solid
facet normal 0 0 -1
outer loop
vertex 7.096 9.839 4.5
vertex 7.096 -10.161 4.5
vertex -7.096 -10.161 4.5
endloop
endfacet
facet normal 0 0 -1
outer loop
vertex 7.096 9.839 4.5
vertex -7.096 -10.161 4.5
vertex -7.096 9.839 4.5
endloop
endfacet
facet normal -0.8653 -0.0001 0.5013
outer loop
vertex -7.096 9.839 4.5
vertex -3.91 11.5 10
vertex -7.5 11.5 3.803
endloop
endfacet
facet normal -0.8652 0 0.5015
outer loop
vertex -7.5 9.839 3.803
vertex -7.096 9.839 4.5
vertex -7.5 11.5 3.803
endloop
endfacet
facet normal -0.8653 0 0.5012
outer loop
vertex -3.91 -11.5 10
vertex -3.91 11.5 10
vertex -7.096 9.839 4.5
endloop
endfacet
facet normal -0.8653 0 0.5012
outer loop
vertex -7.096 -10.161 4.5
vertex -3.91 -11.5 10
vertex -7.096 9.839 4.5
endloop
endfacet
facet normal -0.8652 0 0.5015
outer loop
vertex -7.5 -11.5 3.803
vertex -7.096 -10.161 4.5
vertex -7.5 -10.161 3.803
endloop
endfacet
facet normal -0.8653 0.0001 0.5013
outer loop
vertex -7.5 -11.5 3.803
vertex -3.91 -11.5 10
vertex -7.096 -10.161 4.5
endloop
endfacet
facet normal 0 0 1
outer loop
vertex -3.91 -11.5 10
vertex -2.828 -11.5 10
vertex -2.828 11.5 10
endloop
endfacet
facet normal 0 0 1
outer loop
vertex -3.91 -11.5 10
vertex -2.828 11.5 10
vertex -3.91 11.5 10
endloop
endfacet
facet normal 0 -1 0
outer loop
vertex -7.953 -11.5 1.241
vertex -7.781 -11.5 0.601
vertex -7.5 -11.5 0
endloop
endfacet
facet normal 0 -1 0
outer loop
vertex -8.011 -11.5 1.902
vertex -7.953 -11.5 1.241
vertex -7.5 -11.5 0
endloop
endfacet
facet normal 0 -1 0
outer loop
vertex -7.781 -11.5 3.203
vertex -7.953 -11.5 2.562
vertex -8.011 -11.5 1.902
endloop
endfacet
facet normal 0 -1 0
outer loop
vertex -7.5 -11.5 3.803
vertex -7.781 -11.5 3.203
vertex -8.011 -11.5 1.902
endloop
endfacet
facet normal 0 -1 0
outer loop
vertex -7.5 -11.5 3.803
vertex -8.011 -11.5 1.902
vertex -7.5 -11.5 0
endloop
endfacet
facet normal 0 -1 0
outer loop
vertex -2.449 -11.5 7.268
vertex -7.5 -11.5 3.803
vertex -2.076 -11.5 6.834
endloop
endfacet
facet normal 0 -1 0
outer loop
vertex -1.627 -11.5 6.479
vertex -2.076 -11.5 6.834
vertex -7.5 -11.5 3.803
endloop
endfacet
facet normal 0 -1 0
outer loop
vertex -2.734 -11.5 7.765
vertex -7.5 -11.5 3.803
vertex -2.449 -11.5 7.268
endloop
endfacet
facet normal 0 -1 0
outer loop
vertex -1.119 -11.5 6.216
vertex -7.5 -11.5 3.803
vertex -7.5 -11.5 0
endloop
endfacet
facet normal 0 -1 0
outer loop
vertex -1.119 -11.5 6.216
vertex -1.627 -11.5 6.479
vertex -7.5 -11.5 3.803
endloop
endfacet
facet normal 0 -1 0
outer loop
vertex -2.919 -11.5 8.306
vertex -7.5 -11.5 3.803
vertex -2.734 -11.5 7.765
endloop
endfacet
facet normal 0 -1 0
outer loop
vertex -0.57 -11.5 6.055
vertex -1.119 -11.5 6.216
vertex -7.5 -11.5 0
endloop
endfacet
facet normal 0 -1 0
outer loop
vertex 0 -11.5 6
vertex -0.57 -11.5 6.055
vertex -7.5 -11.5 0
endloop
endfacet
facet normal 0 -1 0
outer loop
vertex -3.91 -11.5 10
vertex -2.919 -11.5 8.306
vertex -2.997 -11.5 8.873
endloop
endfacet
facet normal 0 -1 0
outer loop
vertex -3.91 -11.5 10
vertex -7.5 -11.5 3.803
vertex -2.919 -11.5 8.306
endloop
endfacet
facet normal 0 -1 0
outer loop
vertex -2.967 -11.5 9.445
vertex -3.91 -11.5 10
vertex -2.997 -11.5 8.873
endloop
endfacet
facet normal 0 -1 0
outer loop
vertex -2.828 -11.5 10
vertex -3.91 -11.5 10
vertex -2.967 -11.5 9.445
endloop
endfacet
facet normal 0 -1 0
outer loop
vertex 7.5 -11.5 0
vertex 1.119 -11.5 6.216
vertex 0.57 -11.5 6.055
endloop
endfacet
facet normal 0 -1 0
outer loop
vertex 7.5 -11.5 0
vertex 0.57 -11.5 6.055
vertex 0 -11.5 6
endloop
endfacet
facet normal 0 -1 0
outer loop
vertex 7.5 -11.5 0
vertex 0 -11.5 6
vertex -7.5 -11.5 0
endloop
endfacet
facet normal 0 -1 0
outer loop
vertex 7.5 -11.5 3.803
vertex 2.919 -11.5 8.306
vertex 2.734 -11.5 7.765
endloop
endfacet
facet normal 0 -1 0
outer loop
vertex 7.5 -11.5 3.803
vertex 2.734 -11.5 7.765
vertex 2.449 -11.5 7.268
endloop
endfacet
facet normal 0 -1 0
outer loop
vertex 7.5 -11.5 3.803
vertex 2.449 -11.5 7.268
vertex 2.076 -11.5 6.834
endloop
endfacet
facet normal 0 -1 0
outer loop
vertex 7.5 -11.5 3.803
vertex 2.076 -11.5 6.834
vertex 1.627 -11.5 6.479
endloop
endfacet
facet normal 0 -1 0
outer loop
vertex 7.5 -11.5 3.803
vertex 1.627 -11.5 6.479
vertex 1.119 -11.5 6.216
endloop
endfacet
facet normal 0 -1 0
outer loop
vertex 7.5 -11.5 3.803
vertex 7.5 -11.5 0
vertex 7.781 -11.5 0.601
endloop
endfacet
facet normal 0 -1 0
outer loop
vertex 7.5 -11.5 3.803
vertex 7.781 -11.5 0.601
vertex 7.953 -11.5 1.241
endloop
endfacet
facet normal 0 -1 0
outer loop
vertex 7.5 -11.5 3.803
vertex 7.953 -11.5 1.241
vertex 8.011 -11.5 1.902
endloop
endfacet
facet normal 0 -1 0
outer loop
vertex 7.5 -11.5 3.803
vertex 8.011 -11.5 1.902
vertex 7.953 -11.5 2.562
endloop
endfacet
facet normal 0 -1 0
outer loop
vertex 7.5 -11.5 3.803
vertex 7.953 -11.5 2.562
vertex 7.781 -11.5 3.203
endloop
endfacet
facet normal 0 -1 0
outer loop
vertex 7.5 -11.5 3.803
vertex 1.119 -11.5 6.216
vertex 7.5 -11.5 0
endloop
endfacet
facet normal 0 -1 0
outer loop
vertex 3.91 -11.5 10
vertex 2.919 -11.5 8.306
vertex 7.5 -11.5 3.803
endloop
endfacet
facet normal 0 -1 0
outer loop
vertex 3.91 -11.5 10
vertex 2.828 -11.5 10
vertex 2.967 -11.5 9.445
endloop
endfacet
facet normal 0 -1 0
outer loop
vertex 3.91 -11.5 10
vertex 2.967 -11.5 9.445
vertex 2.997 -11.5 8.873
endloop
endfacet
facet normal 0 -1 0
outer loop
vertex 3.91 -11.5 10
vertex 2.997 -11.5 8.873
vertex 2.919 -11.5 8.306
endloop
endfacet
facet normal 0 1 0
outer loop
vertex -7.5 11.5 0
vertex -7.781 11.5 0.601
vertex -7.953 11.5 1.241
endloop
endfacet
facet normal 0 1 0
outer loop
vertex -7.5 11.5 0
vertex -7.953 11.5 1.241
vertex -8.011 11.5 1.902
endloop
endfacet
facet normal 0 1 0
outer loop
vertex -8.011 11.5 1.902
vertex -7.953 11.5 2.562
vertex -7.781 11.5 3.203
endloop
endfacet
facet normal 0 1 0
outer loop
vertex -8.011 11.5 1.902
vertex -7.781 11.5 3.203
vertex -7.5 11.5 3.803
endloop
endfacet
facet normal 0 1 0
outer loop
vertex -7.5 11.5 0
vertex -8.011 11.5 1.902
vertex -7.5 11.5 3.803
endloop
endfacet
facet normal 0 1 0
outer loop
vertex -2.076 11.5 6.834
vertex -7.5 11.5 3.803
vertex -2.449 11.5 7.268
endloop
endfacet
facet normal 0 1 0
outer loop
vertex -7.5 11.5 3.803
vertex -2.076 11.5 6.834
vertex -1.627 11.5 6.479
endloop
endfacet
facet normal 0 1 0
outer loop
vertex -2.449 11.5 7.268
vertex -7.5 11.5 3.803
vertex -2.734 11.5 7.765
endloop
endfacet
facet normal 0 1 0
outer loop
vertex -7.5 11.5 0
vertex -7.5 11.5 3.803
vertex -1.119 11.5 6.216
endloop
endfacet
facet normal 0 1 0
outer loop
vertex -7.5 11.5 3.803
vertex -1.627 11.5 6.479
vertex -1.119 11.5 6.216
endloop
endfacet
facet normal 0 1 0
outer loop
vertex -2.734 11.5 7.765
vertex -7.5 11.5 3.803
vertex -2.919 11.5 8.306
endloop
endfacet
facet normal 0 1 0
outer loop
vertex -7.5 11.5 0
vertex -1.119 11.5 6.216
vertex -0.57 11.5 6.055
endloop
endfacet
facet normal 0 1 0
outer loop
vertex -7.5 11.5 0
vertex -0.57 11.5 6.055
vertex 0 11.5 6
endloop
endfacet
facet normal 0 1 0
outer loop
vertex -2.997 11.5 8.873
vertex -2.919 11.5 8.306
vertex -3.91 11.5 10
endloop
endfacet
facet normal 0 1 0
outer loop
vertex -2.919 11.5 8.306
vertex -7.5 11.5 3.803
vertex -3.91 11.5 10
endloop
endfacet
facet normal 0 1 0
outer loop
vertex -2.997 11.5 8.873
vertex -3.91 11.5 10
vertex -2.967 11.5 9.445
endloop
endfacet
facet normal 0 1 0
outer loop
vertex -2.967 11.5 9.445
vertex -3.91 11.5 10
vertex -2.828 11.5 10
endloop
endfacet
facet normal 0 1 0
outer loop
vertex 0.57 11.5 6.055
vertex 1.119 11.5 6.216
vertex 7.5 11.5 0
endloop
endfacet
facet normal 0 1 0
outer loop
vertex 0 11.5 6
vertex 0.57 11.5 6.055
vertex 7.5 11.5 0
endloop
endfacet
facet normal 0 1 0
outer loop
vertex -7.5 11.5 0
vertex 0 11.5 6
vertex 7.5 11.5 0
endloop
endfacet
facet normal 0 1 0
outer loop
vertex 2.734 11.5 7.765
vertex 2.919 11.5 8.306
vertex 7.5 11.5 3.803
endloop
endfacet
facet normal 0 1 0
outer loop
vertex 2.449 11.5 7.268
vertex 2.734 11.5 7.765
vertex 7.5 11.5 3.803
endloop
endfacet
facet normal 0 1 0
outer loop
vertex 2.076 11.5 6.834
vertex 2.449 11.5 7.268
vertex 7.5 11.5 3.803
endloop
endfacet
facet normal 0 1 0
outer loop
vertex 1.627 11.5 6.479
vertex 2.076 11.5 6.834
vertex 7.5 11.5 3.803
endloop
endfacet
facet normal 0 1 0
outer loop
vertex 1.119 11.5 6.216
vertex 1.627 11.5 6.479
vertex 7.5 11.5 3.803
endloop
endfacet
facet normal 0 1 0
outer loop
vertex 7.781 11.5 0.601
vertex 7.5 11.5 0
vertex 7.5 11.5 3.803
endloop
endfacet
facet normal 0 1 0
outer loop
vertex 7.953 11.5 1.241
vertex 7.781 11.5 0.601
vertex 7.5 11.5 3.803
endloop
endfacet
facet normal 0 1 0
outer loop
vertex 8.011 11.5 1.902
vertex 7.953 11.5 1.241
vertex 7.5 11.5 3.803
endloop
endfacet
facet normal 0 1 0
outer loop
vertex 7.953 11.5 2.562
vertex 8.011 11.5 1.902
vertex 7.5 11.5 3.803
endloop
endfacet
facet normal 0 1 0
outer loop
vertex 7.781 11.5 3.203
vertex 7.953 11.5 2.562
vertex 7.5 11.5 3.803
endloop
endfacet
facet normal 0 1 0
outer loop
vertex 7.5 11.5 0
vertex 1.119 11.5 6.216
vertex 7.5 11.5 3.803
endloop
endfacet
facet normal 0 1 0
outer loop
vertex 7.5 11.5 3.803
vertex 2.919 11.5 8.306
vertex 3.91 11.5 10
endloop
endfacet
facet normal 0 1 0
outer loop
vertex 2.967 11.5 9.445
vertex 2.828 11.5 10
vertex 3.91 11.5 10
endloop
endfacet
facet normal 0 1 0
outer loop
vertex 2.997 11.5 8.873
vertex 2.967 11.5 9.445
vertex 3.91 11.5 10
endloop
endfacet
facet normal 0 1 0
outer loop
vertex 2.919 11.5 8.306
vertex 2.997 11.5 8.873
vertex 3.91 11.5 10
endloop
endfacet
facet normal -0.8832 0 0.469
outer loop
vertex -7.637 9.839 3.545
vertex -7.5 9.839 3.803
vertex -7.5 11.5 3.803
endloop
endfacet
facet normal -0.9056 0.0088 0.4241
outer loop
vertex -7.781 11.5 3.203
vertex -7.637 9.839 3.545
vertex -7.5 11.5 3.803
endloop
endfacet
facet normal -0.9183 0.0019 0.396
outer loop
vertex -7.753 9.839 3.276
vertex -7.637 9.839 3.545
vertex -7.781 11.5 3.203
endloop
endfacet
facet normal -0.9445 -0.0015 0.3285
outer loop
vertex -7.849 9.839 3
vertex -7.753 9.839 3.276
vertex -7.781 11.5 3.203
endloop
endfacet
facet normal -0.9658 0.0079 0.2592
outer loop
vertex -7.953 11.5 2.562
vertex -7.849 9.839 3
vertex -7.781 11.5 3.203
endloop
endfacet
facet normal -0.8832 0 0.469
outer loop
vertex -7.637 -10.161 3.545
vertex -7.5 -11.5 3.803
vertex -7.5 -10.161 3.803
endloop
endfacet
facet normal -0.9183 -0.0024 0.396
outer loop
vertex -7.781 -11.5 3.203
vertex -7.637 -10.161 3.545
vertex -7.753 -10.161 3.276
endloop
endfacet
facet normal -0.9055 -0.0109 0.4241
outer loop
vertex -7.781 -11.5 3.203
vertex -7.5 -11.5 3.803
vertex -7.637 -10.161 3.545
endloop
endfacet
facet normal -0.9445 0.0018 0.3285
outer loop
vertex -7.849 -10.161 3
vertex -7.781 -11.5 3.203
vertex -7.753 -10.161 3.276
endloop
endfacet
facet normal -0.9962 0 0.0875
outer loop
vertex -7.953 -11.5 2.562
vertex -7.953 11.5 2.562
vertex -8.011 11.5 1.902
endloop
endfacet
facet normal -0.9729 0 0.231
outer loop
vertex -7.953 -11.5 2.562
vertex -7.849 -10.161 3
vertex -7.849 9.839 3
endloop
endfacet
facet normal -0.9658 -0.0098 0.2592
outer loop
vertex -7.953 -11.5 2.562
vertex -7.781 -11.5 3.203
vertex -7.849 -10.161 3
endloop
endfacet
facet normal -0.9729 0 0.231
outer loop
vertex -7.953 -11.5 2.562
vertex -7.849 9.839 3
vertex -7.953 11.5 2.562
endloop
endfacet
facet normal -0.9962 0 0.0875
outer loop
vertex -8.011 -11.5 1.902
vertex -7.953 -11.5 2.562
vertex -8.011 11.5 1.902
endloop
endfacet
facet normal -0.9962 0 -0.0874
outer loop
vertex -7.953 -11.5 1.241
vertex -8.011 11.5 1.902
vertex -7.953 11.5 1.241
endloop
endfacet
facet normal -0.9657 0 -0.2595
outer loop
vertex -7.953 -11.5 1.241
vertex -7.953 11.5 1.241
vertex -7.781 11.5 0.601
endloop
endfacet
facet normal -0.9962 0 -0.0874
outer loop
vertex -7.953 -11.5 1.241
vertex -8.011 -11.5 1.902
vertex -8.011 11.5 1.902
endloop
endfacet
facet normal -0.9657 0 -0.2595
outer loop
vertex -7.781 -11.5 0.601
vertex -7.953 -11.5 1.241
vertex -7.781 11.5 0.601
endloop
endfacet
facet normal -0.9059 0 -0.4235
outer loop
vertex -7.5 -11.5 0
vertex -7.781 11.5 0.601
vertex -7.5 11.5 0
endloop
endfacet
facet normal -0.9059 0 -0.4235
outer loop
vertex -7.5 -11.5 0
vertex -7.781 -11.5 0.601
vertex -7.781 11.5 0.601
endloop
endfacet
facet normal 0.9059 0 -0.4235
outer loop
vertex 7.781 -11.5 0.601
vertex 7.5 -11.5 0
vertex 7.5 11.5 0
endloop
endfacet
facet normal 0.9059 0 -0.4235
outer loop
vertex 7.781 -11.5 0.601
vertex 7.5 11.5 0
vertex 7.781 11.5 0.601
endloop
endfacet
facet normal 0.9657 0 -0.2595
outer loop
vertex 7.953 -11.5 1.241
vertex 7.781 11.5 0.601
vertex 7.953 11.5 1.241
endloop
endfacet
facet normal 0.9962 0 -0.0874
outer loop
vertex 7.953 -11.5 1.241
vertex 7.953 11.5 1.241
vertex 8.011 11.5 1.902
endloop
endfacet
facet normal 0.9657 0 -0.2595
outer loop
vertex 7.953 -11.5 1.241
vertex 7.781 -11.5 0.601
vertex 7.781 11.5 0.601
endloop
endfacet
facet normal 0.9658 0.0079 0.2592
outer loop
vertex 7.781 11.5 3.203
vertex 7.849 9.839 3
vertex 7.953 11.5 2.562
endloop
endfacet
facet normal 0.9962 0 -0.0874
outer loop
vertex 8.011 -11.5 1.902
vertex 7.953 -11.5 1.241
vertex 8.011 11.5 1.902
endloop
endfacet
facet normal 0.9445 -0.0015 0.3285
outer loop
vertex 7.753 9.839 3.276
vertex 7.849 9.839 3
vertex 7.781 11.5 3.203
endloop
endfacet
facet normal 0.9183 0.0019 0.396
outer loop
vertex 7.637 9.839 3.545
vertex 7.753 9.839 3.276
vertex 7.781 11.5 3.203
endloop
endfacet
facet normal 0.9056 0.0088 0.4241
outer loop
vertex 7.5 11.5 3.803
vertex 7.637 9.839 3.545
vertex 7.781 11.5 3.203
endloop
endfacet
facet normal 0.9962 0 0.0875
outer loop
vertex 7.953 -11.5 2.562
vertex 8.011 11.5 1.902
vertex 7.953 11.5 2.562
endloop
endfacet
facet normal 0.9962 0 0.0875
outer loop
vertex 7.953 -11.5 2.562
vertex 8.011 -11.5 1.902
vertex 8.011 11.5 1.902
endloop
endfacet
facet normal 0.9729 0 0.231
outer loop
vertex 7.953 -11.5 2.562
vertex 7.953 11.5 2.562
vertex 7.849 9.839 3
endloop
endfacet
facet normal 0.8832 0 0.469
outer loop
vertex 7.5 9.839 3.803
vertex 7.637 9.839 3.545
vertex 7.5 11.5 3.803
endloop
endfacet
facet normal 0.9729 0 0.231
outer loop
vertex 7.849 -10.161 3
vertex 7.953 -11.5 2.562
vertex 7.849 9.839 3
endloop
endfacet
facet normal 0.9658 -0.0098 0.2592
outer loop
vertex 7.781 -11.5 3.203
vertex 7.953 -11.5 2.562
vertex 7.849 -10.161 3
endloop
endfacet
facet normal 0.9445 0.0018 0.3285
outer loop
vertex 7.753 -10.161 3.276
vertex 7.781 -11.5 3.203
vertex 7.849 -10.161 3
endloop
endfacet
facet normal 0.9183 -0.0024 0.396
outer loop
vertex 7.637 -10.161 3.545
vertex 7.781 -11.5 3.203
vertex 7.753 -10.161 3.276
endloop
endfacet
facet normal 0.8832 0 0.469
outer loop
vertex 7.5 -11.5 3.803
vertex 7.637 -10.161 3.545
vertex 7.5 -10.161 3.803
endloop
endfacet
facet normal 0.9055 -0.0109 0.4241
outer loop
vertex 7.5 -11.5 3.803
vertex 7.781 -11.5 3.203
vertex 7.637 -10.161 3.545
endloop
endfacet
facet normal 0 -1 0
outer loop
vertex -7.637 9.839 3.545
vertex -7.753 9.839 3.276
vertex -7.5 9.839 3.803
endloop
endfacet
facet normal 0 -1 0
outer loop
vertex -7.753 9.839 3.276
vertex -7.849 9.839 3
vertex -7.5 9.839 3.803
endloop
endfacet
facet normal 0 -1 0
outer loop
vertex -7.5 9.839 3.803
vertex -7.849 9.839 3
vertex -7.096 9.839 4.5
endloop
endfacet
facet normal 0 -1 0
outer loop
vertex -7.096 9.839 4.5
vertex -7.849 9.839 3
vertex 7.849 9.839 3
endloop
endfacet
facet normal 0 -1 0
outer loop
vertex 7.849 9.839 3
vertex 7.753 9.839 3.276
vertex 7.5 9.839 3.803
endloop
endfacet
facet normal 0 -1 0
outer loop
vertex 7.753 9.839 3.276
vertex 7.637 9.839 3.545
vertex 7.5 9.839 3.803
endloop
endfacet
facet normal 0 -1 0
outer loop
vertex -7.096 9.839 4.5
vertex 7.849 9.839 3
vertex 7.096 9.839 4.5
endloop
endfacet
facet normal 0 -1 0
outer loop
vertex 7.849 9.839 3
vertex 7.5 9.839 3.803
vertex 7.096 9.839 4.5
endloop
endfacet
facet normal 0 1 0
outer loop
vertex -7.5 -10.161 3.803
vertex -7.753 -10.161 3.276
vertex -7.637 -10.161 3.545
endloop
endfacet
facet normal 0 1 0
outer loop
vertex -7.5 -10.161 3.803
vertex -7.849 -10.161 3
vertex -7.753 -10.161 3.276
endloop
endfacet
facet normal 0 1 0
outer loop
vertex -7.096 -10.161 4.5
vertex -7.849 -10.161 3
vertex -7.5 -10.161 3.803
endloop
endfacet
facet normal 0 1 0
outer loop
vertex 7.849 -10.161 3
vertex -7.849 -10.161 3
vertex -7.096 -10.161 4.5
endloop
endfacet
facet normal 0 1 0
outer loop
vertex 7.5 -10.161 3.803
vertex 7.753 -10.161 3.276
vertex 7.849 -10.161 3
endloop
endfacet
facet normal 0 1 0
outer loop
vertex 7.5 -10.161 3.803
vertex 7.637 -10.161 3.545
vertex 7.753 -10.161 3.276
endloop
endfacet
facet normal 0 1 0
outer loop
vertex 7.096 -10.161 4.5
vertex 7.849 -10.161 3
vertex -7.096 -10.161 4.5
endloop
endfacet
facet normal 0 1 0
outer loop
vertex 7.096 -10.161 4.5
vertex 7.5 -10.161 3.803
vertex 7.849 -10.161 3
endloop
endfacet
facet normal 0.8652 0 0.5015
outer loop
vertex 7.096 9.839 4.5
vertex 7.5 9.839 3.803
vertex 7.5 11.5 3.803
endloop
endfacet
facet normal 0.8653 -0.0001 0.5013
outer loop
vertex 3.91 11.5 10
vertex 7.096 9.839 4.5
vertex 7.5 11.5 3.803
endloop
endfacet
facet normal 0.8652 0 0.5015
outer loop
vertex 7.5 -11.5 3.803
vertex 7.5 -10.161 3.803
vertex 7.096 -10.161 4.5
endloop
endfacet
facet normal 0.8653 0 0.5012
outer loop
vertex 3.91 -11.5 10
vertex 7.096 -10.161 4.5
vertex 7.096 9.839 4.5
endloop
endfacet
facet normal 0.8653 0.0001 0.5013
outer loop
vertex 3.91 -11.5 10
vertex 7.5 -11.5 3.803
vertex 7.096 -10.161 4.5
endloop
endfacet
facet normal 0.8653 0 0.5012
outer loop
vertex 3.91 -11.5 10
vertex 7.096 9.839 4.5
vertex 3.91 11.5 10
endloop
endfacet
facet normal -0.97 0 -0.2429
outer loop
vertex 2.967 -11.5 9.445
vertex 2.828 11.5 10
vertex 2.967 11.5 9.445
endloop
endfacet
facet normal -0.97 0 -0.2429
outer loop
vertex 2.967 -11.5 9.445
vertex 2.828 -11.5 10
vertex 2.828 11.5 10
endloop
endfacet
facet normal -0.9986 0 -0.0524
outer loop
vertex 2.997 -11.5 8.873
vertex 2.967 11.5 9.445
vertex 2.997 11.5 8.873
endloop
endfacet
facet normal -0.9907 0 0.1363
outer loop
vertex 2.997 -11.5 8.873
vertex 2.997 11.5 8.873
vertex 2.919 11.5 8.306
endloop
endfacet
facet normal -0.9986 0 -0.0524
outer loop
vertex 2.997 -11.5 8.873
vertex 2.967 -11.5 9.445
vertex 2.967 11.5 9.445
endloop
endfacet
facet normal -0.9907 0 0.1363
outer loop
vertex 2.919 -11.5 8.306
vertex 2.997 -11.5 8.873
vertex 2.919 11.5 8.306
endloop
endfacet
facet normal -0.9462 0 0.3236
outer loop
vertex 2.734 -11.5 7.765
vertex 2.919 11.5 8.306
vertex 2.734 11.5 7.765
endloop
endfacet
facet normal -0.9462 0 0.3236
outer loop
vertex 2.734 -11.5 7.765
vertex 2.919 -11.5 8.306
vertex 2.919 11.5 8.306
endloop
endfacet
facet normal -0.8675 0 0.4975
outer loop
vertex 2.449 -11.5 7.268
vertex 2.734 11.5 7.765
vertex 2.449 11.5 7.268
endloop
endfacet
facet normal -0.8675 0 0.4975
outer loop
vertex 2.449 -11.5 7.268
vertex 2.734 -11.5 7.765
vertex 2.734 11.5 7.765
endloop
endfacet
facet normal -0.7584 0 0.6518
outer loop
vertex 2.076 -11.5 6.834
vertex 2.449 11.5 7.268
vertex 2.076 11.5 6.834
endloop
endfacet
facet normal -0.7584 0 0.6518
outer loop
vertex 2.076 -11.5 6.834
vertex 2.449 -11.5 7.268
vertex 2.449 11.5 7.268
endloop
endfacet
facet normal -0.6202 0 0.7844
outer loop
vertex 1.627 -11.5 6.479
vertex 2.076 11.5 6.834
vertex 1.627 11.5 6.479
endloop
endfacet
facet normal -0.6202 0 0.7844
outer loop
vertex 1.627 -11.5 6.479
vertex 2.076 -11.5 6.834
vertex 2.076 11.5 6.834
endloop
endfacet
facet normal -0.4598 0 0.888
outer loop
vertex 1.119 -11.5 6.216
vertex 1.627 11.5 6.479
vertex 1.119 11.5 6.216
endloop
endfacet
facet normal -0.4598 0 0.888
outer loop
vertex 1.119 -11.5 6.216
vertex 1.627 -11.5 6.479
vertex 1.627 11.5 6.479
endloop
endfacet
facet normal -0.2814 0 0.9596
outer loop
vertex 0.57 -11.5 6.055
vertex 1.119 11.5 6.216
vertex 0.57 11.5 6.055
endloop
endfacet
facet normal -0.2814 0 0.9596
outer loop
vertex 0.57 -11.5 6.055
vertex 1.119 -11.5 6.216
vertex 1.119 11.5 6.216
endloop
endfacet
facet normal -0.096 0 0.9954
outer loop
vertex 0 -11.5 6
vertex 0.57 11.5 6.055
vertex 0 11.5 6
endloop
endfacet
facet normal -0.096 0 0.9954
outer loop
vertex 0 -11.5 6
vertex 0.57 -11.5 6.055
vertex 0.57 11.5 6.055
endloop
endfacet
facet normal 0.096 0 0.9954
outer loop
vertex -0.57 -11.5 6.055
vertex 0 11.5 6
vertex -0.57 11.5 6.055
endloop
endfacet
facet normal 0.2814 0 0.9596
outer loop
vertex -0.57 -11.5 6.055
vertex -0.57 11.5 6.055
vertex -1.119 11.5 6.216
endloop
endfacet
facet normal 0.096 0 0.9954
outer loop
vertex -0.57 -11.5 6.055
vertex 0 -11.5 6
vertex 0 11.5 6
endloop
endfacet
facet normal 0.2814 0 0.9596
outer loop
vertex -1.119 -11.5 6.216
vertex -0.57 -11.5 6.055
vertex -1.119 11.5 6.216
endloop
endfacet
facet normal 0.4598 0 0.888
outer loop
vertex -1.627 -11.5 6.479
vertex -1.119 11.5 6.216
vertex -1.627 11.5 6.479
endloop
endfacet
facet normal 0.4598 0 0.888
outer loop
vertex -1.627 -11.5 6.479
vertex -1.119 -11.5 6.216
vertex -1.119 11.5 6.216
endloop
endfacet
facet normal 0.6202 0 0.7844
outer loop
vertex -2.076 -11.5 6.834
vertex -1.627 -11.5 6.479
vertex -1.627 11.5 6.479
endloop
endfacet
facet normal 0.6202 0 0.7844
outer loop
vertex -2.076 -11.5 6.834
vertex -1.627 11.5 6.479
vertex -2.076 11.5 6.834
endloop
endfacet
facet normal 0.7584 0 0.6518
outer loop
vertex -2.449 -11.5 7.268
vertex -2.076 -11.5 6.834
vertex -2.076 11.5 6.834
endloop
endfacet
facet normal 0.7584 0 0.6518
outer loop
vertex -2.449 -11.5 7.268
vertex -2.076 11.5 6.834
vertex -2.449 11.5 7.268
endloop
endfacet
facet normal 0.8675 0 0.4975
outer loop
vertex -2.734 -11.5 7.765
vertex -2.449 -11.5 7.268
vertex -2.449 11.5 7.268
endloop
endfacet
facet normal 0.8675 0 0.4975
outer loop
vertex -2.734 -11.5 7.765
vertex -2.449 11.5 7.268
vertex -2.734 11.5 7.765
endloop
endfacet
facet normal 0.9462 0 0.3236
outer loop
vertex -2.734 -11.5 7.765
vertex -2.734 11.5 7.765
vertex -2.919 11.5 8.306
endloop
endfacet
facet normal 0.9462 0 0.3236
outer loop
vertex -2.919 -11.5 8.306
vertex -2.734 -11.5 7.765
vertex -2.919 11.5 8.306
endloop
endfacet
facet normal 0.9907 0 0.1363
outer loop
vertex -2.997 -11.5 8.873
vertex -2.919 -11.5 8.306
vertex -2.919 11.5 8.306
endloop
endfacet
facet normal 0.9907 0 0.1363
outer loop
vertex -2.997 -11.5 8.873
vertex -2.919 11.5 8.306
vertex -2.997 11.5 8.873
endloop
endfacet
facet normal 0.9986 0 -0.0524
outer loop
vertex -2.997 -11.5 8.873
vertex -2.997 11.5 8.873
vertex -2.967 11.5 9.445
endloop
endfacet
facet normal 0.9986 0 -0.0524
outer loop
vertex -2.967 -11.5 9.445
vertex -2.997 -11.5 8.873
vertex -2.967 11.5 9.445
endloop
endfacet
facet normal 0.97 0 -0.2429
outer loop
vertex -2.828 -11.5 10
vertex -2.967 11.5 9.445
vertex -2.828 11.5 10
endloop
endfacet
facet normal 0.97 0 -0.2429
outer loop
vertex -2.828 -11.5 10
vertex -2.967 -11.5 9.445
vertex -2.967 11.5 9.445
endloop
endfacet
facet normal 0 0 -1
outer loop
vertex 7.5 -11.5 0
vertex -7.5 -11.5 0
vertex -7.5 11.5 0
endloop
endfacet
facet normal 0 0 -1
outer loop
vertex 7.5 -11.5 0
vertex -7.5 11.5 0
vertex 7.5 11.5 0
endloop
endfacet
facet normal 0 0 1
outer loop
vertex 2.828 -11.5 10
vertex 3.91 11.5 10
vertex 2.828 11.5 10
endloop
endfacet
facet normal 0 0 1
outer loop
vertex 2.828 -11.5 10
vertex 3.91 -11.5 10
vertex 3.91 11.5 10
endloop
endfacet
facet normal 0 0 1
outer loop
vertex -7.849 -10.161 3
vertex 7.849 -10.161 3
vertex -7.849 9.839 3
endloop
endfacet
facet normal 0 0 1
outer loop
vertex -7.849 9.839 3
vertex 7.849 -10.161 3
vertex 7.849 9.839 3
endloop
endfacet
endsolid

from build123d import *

# Parameters (mm, degrees)
F2_DEPTH = 11.5
F3_W     = 20
F3_H     = 1.5
F4_DEPTH = 12.5


with BuildPart() as f2:
    # F1 (on Front) → F2 (new body, symmetric)
    with BuildSketch(Plane.XZ):
        with BuildLine():
            ThreePointArc((2.8284271247, 10), (0, 6), (-2.8284271247, 10))
            Line((-2.8284271247, 10), (-3.9100694971, 10))
            Line((-3.9100694971, 10), (-7.5, 3.8031570148))
            ThreePointArc((-7.5, 3.8031570148), (-8.011027857, 1.9015785074), (-7.5, 0))
            Line((-7.5, 0), (7.5, 0))
            ThreePointArc((7.5, 0), (8.011027857, 1.9015785074), (7.5, 3.8031570148))
            Line((7.5, 3.8031570148), (3.9100694971, 10))
            Line((3.9100694971, 10), (2.8284271247, 10))
        make_face()
    extrude(amount=F2_DEPTH, both=True)

    # F3 (on Right) → F4 (cut, symmetric)
    with BuildSketch(Plane.YZ):
        with Locations((-0.1611583866, 3.75)):
            Rectangle(F3_W, F3_H)
    extrude(amount=F4_DEPTH, both=True, mode=Mode.SUBTRACT)


solid = f2.part
